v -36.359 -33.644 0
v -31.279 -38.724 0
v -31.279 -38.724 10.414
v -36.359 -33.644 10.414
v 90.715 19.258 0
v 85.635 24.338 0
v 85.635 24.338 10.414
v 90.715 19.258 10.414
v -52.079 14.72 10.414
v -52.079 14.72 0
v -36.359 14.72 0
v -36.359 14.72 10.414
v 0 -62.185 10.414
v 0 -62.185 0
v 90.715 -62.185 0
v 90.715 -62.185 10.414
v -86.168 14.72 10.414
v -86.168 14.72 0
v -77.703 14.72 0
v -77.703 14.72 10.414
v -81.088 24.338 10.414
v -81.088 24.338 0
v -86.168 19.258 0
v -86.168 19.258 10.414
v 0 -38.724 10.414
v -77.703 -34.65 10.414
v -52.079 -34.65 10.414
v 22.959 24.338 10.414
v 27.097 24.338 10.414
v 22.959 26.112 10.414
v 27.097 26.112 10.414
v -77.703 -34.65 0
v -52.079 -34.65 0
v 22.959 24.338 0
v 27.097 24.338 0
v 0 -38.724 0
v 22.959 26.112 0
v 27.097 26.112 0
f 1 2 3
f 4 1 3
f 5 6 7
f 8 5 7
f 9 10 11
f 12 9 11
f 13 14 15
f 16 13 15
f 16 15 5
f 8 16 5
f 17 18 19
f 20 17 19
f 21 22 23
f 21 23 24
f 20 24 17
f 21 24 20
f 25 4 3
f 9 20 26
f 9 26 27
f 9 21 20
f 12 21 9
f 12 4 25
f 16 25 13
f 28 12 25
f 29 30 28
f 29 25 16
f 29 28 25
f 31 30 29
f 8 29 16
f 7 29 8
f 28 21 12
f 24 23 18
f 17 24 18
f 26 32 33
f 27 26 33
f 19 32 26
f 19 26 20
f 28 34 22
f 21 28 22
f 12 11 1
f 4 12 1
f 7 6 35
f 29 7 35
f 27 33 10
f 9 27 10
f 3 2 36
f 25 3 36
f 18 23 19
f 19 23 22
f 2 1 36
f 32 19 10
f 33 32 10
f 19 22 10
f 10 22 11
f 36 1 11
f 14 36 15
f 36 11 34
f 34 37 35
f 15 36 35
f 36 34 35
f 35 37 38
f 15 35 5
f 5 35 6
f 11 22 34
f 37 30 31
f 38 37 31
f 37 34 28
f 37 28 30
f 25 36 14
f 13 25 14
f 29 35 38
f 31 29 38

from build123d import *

# Parameters (mm, degrees)
F0_W     = 30.374784
F0_H     = 50.35834
F0_W_2   = 25.623474
F0_H_2   = 49.36993
F0_W_3   = 4.138445
F0_H_3   = 1.773622
F1_DEPTH = 10.414
F2_SIZE  = 5.08


with BuildPart() as f1:
    # F0 (on Top) → F1 (new body)
    with BuildSketch(Plane.XY):
        Polygon((-30.374784, 24.338016), (-36.359224, 24.338016), (-36.359224, 14.719548), (-36.359224, -38.724054), (0, -38.724054), (0, -26.020324), (-30.374784, -26.020324), align=None)
        Polygon((-36.359224, 14.719548), (-36.359224, 24.338016), (-86.168446, 24.338016), (-86.168446, 14.719548), (-77.702753, 14.719548), (-52.079279, 14.719548), align=None)
        with Locations((-15.187392, -0.841154)):
            Rectangle(F0_W, F0_H)
        Polygon((22.958538, 24.338016), (0, 24.338016), (0, -26.020324), (0, -38.724054), (27.096983, -38.724054), (27.096983, 24.338016), align=None)
        with Locations((-64.891016, -9.965417)):
            Rectangle(F0_W_2, F0_H_2)
        with Locations((25.02776, 25.224827)):
            Rectangle(F0_W_3, F0_H_3)
        Polygon((27.096983, -38.724054), (0, -38.724054), (0, -62.185474), (90.715356, -62.185474), (90.715356, 24.338016), (27.096983, 24.338016), align=None)
    extrude(amount=F1_DEPTH)

    # F2
    f2_edges = [f1.edges().sort_by_distance(p)[0] for p in [
        (-86.168446, 24.338016, 5.207),
        (-36.359224, -38.724054, 5.207),
        (90.715356, 24.338016, 5.207),
    ]]
    chamfer(f2_edges, length=F2_SIZE)


solid = f1.part
